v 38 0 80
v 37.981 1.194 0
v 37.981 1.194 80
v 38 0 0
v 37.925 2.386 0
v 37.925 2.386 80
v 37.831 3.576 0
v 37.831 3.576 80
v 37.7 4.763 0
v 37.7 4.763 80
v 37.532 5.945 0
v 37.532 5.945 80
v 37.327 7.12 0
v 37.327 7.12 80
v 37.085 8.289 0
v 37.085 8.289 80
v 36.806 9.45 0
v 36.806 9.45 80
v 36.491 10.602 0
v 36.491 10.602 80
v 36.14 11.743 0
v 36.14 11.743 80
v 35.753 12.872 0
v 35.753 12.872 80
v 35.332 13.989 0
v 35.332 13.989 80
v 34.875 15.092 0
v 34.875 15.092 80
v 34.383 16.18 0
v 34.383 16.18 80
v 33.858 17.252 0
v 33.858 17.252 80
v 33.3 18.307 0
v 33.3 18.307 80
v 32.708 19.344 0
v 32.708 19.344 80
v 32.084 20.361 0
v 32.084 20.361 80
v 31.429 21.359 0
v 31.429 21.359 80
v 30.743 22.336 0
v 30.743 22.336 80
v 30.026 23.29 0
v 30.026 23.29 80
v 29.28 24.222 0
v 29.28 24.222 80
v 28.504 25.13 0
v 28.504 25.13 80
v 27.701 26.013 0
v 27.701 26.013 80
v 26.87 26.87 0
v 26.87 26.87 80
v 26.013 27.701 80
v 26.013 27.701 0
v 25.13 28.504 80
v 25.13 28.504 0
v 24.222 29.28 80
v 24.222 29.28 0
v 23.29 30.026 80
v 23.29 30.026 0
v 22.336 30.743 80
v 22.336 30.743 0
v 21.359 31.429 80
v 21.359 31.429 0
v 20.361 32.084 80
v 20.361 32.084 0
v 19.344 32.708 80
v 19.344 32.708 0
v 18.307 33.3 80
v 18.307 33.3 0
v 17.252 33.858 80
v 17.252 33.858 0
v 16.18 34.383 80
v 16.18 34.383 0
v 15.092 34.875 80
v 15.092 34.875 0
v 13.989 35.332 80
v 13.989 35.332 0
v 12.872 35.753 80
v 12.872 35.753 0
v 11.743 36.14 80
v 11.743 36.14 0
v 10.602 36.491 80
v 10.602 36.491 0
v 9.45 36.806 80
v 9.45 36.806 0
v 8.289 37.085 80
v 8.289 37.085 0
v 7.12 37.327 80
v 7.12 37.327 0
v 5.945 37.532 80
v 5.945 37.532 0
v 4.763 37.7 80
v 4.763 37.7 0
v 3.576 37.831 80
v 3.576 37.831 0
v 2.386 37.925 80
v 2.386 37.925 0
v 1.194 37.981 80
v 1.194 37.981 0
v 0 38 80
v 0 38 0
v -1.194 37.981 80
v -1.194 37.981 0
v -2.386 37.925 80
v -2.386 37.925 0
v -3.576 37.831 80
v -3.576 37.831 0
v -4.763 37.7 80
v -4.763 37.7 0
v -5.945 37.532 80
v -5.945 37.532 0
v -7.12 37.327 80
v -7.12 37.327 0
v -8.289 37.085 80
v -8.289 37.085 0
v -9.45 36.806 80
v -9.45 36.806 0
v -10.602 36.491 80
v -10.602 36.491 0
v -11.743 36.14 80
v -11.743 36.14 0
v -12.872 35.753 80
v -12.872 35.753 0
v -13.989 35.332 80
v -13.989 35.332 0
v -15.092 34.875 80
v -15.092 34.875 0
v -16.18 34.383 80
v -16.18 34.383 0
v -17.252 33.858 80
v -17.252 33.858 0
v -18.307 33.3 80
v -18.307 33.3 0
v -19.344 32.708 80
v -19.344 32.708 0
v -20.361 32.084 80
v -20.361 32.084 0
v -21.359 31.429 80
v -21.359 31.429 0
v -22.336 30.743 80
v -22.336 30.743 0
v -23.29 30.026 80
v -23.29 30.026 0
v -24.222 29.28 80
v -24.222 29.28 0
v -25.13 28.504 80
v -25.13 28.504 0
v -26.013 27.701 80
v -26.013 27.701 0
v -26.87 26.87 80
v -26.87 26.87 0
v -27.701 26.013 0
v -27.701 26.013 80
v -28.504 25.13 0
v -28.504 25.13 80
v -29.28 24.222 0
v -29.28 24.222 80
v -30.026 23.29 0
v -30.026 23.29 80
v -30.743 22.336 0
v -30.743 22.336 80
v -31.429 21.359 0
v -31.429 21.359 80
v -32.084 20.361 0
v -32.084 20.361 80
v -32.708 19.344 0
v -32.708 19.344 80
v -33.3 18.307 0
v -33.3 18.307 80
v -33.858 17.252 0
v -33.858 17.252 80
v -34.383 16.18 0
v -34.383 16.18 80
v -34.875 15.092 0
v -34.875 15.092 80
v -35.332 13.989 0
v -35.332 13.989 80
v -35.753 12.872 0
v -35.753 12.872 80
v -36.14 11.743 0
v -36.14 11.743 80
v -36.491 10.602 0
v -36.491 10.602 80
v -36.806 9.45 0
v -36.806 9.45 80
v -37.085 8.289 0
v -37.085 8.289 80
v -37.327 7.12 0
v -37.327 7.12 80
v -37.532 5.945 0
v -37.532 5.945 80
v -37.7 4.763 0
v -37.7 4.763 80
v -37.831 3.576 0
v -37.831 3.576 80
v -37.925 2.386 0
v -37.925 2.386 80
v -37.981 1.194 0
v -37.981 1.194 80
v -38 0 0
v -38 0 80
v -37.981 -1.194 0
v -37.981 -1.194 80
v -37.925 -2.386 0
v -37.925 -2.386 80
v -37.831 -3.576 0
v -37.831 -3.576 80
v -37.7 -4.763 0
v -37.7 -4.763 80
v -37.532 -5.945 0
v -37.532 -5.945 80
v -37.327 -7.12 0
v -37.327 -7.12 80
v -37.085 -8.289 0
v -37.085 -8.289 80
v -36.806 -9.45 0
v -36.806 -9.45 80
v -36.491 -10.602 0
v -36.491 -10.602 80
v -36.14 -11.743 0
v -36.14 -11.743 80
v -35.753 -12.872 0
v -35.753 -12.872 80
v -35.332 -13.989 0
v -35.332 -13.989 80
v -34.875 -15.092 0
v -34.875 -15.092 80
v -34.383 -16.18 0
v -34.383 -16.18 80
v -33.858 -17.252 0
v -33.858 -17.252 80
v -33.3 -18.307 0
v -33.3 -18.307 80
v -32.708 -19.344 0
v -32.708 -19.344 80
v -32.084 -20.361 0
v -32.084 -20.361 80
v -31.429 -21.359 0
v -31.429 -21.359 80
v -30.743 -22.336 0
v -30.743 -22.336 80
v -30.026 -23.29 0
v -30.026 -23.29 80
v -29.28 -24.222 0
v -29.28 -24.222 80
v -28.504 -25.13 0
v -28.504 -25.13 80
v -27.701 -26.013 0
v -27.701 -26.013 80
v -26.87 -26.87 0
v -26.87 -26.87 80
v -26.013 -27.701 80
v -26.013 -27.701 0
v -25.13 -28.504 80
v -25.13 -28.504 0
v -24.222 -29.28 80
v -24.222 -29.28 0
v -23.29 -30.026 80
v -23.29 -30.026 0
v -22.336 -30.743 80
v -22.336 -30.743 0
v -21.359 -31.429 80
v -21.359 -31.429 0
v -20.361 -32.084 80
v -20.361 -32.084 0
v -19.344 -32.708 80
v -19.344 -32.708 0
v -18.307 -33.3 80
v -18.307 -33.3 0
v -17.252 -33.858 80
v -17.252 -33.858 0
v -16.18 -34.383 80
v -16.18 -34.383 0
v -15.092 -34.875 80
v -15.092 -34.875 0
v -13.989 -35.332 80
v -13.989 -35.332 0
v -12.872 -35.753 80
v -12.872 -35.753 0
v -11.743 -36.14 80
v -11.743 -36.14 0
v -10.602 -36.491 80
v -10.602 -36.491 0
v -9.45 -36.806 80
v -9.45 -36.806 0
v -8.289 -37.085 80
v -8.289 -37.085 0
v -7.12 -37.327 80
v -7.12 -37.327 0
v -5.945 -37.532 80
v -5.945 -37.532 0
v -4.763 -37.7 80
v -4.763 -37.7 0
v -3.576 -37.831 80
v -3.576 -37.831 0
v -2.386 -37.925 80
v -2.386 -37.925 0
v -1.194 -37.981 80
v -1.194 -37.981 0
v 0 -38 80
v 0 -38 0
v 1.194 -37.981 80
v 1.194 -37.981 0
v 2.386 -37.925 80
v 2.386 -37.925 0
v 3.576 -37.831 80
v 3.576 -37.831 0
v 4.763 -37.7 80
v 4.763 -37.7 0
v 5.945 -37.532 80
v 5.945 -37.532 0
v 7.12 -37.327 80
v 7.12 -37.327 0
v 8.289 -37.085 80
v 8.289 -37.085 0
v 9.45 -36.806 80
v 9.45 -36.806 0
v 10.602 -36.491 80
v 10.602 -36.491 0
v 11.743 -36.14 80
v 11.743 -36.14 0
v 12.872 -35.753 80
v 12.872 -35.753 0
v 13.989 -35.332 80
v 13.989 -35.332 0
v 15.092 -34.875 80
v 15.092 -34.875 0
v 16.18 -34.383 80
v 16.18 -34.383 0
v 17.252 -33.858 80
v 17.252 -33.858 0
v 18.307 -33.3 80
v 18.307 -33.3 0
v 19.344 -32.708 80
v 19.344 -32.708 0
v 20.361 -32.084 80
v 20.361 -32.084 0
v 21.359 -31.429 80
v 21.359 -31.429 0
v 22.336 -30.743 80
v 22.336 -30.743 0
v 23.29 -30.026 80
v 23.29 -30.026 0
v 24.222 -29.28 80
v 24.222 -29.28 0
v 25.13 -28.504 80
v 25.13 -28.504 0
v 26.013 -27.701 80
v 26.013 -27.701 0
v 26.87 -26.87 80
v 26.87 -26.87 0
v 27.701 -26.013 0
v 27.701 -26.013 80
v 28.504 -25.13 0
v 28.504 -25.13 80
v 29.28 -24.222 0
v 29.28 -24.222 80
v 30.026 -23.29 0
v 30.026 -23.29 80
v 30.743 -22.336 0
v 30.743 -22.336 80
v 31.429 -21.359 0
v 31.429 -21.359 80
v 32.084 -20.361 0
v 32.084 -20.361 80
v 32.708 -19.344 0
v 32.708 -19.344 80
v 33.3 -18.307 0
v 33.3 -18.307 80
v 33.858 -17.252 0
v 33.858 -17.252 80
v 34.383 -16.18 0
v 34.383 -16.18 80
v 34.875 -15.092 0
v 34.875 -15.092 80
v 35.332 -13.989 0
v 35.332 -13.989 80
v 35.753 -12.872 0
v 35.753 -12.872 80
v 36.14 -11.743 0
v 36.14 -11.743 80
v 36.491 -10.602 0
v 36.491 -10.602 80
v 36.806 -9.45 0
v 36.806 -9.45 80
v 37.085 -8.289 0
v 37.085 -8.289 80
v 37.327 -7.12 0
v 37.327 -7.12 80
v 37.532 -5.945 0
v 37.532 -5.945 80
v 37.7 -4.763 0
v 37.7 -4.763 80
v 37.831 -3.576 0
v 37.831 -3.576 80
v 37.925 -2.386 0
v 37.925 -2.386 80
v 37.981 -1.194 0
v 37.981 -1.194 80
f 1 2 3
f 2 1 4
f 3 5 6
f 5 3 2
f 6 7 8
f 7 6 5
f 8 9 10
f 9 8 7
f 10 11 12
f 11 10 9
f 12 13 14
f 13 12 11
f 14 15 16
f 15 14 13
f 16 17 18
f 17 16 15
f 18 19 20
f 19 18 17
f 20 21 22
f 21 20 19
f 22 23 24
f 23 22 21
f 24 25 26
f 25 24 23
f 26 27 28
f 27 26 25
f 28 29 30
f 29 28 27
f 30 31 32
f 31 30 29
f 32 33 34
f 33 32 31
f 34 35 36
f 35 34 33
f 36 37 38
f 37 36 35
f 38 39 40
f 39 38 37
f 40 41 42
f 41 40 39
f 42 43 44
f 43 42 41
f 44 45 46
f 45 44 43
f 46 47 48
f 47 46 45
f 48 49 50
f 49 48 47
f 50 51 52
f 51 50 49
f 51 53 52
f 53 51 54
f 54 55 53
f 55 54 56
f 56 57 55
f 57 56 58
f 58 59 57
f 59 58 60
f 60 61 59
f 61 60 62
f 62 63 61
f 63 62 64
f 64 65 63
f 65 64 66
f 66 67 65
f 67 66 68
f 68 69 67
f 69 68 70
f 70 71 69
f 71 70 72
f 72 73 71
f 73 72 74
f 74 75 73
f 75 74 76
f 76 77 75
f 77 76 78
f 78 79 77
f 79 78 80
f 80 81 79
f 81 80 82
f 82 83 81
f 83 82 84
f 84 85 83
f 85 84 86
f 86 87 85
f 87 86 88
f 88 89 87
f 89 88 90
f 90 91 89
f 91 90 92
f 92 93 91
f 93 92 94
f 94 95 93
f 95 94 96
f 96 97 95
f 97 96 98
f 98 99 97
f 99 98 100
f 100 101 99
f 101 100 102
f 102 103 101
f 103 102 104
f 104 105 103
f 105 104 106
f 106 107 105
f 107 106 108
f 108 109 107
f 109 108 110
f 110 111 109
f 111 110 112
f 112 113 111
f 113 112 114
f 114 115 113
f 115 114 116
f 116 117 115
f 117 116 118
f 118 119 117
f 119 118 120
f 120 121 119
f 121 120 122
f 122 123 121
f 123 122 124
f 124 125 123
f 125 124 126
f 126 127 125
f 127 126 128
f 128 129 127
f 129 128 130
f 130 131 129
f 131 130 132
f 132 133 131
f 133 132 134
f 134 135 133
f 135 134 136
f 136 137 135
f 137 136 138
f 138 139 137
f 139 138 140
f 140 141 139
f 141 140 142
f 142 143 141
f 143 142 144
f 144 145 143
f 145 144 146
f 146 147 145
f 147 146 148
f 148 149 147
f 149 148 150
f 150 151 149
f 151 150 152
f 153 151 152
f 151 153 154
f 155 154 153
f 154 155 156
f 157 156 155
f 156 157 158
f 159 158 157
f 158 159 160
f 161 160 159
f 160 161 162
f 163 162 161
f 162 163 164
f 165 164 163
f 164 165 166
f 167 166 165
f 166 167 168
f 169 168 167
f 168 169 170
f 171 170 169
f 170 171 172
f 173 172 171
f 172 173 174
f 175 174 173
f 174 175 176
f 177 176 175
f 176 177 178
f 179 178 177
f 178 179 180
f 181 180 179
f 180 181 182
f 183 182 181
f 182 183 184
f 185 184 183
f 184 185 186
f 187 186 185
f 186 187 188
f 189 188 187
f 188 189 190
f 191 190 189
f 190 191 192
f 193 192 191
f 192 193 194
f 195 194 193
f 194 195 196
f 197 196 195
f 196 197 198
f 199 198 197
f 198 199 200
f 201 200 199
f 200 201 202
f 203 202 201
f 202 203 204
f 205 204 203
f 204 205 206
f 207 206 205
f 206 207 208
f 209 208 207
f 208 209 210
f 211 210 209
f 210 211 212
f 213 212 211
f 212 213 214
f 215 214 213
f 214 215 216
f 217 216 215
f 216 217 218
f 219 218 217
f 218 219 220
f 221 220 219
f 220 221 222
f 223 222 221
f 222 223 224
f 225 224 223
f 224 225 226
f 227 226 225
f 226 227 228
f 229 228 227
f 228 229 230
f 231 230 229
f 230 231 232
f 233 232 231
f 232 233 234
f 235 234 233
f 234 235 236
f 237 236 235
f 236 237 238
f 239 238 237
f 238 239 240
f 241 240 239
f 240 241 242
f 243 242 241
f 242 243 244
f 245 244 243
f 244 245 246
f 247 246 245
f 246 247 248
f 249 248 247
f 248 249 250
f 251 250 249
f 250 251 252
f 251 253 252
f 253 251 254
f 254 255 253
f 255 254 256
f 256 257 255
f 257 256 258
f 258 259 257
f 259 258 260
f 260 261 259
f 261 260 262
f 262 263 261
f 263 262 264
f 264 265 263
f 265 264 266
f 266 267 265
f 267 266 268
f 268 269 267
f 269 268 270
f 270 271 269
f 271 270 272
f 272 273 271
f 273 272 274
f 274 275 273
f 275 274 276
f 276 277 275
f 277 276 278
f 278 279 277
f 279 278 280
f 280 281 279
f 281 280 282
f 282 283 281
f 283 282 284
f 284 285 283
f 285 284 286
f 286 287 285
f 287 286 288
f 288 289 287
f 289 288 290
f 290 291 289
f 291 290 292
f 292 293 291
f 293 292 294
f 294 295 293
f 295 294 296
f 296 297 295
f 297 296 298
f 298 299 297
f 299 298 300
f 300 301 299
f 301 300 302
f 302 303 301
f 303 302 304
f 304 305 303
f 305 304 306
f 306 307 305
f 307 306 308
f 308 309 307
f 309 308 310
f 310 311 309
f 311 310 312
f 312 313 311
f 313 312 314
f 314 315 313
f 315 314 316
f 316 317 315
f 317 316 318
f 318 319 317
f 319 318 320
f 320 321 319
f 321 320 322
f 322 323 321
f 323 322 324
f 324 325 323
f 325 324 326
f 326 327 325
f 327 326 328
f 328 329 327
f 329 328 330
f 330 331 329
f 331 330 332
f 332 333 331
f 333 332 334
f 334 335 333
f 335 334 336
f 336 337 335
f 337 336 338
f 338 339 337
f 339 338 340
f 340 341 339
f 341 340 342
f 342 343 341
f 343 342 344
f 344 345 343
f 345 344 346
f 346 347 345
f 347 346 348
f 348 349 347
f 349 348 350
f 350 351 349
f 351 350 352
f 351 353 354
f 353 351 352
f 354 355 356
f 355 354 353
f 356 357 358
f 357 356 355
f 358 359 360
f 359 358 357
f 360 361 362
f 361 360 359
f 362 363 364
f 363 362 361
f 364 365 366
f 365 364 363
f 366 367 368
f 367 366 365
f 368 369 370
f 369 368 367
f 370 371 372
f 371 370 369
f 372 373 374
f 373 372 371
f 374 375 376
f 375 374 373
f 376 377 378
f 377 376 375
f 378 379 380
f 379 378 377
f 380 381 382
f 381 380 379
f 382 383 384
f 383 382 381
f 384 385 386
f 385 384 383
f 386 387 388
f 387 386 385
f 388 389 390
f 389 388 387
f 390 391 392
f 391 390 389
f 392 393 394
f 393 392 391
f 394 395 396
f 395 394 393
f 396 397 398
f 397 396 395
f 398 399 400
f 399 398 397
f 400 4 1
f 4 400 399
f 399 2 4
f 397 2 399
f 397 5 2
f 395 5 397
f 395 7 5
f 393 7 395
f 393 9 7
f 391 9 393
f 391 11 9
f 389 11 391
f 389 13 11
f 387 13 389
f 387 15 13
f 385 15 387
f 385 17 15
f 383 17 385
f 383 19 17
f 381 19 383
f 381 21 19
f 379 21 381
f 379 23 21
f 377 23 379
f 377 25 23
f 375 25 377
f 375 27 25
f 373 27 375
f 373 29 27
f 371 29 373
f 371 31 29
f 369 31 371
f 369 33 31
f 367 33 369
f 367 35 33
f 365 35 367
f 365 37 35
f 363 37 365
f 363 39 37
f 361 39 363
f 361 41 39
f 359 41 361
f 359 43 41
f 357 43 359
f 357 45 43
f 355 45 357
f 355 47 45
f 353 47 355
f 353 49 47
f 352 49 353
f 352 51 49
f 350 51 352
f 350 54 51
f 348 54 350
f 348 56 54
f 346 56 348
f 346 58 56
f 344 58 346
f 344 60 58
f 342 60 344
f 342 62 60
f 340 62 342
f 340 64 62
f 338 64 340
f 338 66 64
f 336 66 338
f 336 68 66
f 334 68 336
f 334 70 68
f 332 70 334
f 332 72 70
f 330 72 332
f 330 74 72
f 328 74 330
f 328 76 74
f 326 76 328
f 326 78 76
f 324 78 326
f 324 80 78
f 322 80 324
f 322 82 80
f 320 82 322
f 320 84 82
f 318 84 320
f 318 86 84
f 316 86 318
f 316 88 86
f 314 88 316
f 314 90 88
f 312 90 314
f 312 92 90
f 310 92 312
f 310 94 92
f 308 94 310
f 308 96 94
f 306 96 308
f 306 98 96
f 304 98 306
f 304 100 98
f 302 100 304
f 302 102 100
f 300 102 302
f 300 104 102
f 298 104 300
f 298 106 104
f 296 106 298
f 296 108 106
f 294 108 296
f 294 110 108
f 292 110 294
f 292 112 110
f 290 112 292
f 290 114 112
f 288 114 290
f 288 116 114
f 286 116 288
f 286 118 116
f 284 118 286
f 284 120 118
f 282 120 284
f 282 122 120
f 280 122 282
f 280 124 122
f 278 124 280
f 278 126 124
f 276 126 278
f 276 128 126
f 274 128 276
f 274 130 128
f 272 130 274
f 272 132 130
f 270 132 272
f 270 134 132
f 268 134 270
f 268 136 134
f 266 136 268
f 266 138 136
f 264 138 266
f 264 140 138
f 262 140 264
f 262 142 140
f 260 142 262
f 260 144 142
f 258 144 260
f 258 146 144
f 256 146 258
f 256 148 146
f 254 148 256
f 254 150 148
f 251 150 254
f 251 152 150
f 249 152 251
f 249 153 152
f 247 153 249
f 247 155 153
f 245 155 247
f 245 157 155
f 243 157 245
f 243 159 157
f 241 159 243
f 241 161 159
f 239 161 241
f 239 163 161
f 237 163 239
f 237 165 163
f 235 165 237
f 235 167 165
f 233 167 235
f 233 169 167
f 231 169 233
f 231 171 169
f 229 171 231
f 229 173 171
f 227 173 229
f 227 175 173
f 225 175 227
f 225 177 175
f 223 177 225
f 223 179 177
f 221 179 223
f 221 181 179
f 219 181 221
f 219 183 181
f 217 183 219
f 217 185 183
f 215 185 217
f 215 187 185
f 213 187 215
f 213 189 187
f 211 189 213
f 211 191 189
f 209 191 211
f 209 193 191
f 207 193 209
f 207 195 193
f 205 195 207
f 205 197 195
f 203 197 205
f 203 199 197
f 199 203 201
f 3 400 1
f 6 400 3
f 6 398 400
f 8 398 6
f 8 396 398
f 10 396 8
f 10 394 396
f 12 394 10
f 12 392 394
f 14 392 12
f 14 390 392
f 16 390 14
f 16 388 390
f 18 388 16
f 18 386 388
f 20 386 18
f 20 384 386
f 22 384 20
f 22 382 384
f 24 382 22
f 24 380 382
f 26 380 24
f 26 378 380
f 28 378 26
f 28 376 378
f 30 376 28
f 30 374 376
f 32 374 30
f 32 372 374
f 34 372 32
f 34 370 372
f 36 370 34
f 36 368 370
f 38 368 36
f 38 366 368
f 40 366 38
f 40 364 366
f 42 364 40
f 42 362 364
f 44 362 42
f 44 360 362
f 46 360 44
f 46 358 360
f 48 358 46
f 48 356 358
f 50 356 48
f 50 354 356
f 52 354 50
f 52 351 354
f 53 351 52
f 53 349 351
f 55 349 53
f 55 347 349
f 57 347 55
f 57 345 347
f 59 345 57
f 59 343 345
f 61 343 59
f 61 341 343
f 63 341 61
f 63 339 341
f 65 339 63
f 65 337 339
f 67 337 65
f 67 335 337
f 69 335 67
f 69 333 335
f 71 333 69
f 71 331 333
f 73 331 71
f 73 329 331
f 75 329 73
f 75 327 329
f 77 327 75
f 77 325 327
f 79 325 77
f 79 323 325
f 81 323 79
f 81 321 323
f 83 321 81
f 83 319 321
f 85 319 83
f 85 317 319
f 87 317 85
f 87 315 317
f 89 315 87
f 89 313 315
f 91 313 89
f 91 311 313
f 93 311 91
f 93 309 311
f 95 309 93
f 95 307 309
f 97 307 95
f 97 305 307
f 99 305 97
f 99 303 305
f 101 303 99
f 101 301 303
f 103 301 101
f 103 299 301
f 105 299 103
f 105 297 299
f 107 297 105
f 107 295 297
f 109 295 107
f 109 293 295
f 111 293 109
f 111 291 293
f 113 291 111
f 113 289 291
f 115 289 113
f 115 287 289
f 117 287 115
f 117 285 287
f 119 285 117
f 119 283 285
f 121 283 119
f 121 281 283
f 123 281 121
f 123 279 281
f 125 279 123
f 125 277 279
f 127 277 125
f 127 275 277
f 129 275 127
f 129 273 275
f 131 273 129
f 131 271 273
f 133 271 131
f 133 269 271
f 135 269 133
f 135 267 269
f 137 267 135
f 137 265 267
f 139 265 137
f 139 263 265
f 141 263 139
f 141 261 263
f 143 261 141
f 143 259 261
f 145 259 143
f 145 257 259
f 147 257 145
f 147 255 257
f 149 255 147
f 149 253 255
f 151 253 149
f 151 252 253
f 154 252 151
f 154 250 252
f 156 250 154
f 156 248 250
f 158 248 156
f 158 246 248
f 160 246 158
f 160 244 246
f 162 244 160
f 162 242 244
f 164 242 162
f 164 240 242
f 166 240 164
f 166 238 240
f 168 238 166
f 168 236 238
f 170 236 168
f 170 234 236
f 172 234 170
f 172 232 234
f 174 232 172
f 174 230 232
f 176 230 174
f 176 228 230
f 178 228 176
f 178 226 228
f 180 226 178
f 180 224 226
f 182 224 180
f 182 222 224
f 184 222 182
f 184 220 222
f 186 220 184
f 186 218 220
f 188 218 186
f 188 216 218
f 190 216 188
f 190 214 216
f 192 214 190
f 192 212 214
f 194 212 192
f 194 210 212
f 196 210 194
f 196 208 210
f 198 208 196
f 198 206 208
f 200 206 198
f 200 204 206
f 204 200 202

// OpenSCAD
$fn = 200;

// Big steel pot
// db = 95;
// dt = 129;
// h = 114;
// Small steel pot
// db = 88;
// dt = 110;
// h = 98;

// cylinder(d2=dt,d1=db,h=h,$fn=100);

// Big can
d = 76;
h = 80;

cylinder(d = d, h = h);
